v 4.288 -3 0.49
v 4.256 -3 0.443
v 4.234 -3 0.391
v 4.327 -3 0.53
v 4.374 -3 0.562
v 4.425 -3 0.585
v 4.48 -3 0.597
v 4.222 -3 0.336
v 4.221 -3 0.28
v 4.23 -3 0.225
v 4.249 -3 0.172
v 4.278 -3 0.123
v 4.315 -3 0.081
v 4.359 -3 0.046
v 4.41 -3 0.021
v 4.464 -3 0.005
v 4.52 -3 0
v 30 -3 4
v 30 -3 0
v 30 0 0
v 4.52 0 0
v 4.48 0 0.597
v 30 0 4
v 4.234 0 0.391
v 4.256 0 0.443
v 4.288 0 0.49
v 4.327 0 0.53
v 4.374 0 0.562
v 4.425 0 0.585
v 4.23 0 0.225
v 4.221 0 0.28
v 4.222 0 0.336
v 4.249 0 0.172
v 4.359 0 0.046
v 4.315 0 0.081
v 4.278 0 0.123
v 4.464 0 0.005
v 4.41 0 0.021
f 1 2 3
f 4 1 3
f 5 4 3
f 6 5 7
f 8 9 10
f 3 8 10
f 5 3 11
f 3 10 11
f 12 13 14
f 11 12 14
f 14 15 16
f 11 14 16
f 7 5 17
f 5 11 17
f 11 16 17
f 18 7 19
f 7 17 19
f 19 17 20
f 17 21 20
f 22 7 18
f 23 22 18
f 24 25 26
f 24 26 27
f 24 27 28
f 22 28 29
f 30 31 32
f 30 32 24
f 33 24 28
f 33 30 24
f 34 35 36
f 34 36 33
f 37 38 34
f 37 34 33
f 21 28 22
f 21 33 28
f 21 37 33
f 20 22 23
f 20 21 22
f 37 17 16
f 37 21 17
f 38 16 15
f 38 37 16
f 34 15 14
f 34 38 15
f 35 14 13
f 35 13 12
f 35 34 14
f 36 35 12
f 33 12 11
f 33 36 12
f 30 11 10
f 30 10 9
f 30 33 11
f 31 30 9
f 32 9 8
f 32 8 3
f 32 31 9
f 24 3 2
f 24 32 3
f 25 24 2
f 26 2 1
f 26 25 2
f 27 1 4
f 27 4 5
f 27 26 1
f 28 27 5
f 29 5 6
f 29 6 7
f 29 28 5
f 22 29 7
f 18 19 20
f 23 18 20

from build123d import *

# Parameters (mm, degrees)
F0_W     = 30
F0_H     = 3
F1_DEPTH = 4
F3_DEPTH = 25
F4_R     = 0.3


with BuildPart() as f1:
    # F0 (on Top) → F1 (new body)
    with BuildSketch(Plane.XY):
        with Locations((15, -1.5)):
            Rectangle(F0_W, F0_H)
    extrude(amount=F1_DEPTH)

    # F2 (on face) → F3 (cut)
    with BuildSketch(Plane.XZ.offset(3)):
        Polygon((0, 4), (0, 0), (30, 4), align=None)
    extrude(amount=-F3_DEPTH, mode=Mode.SUBTRACT)

    # F4
    f4_edges = [f1.edges().sort_by_distance(p)[0] for p in [
        (0, -1.5, 0),
    ]]
    fillet(f4_edges, radius=F4_R)


solid = f1.part
